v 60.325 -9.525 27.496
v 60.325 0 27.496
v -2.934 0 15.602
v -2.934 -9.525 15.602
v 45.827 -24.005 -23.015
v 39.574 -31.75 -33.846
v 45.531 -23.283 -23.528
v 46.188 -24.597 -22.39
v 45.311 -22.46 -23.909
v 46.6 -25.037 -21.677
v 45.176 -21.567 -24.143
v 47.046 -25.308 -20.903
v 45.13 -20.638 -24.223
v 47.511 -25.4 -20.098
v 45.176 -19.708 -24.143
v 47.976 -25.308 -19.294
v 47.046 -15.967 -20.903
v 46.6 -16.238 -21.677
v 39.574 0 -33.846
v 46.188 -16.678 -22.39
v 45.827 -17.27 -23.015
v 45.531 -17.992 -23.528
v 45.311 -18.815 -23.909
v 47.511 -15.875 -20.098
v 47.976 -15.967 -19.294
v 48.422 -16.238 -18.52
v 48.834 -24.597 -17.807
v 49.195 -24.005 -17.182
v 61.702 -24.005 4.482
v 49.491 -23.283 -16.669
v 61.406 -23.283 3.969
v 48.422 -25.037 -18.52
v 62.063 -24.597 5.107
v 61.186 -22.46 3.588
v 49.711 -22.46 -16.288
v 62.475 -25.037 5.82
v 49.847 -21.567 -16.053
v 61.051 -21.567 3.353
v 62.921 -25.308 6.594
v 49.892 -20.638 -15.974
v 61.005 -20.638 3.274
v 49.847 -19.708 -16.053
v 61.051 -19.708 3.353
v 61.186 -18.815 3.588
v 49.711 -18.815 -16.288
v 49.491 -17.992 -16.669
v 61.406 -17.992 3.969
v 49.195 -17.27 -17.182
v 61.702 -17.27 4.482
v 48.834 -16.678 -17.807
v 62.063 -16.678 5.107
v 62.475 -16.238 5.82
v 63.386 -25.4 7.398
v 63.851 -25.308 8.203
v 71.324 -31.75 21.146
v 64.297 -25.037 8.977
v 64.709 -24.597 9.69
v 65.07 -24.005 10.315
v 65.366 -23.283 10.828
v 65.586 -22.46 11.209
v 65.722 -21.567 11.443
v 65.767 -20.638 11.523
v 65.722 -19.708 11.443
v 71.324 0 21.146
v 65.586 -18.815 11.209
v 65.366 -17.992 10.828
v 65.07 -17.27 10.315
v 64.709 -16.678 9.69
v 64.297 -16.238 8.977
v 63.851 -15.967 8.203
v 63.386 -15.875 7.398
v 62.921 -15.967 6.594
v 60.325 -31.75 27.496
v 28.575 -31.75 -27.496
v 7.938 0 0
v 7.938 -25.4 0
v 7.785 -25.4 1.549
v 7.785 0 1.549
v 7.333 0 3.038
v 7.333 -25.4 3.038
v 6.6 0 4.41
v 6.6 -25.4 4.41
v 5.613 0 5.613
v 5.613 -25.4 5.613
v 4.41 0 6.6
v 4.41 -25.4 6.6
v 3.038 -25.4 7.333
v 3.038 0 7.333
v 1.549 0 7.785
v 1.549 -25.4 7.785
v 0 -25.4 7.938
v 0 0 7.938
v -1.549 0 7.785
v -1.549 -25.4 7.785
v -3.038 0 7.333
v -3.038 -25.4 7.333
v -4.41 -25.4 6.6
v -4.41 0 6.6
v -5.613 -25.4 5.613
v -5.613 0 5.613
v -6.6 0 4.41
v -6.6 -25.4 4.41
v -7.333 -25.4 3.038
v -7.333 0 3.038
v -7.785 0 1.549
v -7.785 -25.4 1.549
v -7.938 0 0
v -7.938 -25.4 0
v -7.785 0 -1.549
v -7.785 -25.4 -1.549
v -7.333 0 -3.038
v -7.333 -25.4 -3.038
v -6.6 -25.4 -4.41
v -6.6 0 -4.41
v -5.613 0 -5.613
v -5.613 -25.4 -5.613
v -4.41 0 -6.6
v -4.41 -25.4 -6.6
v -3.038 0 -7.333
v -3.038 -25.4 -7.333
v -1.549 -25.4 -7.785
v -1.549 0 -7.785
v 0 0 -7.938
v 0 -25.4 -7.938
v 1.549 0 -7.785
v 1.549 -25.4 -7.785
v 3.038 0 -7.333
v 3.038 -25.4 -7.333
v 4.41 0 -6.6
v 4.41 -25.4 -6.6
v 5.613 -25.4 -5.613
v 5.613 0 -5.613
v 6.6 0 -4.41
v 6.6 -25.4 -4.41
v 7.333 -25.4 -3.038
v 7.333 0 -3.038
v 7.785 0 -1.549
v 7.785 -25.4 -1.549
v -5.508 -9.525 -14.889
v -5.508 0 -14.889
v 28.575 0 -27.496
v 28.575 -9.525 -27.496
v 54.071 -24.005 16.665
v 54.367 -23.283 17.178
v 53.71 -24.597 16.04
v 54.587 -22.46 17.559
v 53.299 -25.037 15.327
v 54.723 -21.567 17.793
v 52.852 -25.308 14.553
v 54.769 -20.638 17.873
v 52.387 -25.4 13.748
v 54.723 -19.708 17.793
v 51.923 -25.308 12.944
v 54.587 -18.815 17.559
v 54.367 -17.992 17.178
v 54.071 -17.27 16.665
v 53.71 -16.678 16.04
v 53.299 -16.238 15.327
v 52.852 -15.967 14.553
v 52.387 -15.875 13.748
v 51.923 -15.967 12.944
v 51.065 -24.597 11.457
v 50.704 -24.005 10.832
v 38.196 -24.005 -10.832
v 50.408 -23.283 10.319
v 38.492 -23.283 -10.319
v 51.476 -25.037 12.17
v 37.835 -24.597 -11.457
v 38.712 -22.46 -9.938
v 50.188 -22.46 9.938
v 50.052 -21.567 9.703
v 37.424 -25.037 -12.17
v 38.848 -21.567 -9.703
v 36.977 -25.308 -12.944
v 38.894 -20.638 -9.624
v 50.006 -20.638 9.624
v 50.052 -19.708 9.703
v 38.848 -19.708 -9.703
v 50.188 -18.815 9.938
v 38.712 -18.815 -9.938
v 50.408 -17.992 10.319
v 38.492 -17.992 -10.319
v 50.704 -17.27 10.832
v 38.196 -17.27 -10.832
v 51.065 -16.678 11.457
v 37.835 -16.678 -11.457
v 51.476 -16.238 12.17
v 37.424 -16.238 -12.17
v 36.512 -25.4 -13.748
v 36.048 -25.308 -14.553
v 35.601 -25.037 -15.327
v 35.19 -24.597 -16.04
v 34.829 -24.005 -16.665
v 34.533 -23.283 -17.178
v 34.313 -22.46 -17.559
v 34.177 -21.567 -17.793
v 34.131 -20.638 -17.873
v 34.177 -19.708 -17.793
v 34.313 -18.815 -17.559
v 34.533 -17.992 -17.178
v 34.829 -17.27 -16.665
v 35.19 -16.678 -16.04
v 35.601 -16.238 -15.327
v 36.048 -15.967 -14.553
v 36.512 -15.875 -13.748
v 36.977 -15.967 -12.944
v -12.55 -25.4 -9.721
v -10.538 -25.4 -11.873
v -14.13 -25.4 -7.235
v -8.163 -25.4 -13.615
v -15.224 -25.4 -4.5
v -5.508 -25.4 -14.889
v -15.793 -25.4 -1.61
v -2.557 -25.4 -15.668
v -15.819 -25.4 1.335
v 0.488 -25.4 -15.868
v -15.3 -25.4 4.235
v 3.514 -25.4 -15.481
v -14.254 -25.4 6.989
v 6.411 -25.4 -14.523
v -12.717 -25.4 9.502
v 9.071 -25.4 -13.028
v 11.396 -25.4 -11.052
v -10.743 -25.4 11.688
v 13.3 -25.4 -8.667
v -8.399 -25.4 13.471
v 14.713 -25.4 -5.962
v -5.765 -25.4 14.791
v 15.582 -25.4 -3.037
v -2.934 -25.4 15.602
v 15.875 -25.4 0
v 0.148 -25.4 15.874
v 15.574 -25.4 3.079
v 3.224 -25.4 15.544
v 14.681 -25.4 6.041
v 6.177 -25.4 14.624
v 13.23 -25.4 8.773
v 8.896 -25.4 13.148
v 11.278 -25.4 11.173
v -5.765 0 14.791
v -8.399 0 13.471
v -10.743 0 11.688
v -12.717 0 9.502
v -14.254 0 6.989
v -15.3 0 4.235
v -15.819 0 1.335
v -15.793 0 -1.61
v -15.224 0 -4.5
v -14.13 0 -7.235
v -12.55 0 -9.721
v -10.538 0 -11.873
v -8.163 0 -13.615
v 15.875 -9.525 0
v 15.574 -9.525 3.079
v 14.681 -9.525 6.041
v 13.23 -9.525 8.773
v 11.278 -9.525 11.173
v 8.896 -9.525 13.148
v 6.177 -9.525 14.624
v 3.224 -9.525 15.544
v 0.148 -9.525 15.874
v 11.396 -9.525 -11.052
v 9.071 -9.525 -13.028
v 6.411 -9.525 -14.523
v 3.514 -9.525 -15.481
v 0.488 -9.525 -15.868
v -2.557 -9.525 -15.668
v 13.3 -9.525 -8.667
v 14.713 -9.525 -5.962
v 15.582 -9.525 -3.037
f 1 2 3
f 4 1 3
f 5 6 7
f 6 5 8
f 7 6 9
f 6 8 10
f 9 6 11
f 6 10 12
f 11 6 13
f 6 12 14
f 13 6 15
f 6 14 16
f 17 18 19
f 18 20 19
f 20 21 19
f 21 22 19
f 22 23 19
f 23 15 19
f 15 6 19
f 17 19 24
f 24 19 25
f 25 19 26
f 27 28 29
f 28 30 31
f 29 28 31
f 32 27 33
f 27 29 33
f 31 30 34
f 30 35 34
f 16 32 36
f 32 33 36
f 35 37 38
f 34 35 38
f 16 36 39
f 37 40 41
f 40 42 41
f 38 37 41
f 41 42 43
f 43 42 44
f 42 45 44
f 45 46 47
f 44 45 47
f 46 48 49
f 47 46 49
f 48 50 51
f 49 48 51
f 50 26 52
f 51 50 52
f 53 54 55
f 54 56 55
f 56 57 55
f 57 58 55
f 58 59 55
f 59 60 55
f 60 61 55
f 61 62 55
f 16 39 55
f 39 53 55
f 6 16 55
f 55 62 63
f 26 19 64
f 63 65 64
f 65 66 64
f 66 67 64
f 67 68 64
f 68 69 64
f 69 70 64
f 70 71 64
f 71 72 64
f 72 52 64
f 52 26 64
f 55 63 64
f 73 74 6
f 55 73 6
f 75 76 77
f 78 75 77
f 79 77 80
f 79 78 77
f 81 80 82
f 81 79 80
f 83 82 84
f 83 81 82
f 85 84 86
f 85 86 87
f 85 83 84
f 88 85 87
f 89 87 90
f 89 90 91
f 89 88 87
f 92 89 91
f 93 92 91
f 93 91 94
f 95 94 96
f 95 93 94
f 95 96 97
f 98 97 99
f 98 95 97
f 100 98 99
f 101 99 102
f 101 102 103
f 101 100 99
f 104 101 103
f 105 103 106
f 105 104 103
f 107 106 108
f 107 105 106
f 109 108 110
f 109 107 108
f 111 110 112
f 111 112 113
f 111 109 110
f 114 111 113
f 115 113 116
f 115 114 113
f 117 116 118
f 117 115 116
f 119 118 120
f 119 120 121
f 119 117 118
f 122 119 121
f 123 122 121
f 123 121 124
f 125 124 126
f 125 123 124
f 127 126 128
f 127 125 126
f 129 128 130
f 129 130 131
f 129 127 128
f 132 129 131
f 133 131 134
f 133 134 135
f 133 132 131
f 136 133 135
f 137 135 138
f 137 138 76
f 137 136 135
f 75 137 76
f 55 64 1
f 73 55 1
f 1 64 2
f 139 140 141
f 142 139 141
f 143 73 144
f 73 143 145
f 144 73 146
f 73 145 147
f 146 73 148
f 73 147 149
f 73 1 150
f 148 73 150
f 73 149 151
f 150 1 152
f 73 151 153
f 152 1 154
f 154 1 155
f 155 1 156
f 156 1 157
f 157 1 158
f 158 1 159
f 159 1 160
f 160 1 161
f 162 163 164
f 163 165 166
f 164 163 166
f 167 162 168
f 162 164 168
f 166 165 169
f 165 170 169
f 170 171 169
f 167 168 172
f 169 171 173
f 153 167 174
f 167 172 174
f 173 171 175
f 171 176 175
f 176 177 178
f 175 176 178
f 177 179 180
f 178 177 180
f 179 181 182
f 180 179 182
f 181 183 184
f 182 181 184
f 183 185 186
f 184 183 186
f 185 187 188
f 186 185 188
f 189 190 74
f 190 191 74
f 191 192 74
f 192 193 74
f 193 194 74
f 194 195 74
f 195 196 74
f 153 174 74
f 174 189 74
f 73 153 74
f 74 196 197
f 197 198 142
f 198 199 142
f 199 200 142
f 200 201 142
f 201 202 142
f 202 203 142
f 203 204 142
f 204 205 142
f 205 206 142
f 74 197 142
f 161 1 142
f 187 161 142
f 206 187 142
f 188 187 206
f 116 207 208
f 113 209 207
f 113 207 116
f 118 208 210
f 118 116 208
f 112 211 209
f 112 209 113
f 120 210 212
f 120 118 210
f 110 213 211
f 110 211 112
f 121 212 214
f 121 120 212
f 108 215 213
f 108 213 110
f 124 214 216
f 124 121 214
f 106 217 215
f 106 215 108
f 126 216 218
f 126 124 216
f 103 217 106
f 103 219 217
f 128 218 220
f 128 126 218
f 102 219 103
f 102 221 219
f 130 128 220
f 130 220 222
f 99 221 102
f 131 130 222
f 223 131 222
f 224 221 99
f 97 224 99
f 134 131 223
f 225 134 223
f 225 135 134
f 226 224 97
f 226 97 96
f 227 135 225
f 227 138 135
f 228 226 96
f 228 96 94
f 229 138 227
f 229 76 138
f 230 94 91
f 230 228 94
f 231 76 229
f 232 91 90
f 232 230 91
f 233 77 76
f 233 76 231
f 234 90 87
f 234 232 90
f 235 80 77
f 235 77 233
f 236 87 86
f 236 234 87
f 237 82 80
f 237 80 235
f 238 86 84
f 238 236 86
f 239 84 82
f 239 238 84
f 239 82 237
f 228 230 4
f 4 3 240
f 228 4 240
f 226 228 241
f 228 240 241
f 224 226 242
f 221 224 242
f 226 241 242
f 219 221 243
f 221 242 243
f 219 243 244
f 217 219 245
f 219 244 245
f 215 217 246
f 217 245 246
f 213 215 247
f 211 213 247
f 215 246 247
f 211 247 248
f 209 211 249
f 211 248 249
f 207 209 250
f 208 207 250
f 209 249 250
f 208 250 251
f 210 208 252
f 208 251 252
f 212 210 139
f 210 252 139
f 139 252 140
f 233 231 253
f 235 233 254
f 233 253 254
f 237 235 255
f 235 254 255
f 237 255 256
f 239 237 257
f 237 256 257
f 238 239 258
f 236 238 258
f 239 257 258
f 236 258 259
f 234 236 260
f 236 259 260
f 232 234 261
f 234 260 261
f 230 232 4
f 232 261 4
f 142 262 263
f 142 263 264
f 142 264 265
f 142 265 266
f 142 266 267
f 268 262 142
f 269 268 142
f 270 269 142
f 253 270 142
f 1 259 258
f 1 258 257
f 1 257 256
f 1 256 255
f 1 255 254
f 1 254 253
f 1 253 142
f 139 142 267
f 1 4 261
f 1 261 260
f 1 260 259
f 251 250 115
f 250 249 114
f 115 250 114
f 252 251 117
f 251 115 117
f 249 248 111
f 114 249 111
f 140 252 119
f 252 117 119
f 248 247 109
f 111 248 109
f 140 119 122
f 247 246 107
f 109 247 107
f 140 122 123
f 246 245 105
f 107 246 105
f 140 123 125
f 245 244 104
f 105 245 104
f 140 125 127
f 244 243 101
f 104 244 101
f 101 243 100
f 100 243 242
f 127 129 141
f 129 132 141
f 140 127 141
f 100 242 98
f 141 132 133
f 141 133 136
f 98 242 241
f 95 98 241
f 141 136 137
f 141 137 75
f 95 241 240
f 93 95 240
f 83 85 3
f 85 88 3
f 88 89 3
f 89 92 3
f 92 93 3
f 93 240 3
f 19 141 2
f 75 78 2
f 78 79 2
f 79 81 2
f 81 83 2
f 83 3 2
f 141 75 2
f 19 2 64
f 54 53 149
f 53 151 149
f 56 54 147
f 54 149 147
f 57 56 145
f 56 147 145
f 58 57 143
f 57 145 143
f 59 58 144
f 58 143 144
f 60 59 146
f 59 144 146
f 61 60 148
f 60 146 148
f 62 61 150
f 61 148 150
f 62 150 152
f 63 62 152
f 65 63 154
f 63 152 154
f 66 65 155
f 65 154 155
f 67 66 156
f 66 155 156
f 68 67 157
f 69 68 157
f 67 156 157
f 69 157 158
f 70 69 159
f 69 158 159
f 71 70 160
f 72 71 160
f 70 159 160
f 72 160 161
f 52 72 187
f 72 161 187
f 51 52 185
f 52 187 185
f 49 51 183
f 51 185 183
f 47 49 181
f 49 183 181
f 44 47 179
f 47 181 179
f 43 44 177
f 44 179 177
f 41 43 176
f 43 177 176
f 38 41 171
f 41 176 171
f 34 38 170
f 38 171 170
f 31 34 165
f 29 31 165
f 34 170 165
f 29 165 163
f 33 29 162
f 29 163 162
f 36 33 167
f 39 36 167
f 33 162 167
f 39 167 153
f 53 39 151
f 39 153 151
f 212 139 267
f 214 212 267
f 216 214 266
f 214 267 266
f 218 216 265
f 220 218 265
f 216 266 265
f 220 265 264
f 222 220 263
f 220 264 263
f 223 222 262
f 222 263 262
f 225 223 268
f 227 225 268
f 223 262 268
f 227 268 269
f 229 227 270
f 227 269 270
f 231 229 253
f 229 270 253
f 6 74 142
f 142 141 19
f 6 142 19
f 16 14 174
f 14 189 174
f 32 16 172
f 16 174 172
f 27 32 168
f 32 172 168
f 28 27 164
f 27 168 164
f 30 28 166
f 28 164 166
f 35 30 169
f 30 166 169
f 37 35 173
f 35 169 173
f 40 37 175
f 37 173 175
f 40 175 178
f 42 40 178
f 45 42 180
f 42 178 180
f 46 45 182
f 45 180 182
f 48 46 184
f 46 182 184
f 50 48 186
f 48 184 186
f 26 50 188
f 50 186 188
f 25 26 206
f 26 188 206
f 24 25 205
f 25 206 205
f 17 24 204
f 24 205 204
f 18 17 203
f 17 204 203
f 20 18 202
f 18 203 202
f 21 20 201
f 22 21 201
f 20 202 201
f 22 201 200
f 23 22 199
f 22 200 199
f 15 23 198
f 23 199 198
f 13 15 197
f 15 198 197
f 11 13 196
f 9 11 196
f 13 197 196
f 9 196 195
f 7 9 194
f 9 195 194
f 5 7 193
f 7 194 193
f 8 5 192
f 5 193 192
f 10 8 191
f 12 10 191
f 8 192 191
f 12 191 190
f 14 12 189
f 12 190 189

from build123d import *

# Parameters (mm, degrees)
F1_DEPTH = 9.525
F0_R     = 7.9375
F2_DEPTH = 25.4
F3_DEPTH = 31.75
F5_D     = 9.525
F5_DEPTH = 12.7
F5_TIP   = 2.8615986981


with BuildPart() as f1:
    # F0 (on Front) → F1 (new body)
    with BuildSketch(Plane.XZ):
        with BuildLine():
            ThreePointArc((-2.933616207, 15.6015871292), (10.135197771, 12.2185674751), (15.875, 0))
            ThreePointArc((15.875, 0), (9.0714869373, -13.0278067896), (-5.5075196531, -14.8890178411))
            Line((-5.5075196531, -14.8890178411), (28.575, -27.4963065702))
            Line((28.575, -27.4963065702), (60.325, 27.4963065702))
            Line((60.325, 27.4963065702), (-2.933616207, 15.6015871292))
        make_face()
    extrude(amount=F1_DEPTH)

    # F0 (on Front) → F2 (join)
    with BuildSketch(Plane.XZ):
        with BuildLine():
            ThreePointArc((-5.5075196531, -14.8890178411), (9.0714869373, -13.0278067896), (15.875, 0))
            ThreePointArc((15.875, 0), (10.135197771, 12.2185674751), (-2.933616207, 15.6015871292))
            ThreePointArc((-2.933616207, 15.6015871292), (-15.8187370392, 1.3353589349), (-5.5075196531, -14.8890178411))
        make_face()
        Circle(F0_R, mode=Mode.SUBTRACT)
    extrude(amount=F2_DEPTH)

    # F0 (on Front) → F3 (join)
    with BuildSketch(Plane.XZ):
        Polygon((71.3235226281, 21.1463065702), (60.325, 27.4963065702), (28.575, -27.4963065702), (39.5735226281, -33.8463065702), align=None)
    extrude(amount=F3_DEPTH)

    # F5
    with Locations(Plane(origin=(44.3360226281, 0, -25.5974145991), x_dir=(0, 1, 0), z_dir=(0.8660254038, 0, -0.5))):
        with Locations((-20.6375, 6.35), (-20.6375, 38.1)):
            Hole(F5_D / 2, depth=F5_DEPTH)
            with Locations((0, 0, -(F5_DEPTH + F5_TIP / 2))):  # 118° drill point
                Cone(0, F5_D / 2, F5_TIP, mode=Mode.SUBTRACT)


solid = f1.part
